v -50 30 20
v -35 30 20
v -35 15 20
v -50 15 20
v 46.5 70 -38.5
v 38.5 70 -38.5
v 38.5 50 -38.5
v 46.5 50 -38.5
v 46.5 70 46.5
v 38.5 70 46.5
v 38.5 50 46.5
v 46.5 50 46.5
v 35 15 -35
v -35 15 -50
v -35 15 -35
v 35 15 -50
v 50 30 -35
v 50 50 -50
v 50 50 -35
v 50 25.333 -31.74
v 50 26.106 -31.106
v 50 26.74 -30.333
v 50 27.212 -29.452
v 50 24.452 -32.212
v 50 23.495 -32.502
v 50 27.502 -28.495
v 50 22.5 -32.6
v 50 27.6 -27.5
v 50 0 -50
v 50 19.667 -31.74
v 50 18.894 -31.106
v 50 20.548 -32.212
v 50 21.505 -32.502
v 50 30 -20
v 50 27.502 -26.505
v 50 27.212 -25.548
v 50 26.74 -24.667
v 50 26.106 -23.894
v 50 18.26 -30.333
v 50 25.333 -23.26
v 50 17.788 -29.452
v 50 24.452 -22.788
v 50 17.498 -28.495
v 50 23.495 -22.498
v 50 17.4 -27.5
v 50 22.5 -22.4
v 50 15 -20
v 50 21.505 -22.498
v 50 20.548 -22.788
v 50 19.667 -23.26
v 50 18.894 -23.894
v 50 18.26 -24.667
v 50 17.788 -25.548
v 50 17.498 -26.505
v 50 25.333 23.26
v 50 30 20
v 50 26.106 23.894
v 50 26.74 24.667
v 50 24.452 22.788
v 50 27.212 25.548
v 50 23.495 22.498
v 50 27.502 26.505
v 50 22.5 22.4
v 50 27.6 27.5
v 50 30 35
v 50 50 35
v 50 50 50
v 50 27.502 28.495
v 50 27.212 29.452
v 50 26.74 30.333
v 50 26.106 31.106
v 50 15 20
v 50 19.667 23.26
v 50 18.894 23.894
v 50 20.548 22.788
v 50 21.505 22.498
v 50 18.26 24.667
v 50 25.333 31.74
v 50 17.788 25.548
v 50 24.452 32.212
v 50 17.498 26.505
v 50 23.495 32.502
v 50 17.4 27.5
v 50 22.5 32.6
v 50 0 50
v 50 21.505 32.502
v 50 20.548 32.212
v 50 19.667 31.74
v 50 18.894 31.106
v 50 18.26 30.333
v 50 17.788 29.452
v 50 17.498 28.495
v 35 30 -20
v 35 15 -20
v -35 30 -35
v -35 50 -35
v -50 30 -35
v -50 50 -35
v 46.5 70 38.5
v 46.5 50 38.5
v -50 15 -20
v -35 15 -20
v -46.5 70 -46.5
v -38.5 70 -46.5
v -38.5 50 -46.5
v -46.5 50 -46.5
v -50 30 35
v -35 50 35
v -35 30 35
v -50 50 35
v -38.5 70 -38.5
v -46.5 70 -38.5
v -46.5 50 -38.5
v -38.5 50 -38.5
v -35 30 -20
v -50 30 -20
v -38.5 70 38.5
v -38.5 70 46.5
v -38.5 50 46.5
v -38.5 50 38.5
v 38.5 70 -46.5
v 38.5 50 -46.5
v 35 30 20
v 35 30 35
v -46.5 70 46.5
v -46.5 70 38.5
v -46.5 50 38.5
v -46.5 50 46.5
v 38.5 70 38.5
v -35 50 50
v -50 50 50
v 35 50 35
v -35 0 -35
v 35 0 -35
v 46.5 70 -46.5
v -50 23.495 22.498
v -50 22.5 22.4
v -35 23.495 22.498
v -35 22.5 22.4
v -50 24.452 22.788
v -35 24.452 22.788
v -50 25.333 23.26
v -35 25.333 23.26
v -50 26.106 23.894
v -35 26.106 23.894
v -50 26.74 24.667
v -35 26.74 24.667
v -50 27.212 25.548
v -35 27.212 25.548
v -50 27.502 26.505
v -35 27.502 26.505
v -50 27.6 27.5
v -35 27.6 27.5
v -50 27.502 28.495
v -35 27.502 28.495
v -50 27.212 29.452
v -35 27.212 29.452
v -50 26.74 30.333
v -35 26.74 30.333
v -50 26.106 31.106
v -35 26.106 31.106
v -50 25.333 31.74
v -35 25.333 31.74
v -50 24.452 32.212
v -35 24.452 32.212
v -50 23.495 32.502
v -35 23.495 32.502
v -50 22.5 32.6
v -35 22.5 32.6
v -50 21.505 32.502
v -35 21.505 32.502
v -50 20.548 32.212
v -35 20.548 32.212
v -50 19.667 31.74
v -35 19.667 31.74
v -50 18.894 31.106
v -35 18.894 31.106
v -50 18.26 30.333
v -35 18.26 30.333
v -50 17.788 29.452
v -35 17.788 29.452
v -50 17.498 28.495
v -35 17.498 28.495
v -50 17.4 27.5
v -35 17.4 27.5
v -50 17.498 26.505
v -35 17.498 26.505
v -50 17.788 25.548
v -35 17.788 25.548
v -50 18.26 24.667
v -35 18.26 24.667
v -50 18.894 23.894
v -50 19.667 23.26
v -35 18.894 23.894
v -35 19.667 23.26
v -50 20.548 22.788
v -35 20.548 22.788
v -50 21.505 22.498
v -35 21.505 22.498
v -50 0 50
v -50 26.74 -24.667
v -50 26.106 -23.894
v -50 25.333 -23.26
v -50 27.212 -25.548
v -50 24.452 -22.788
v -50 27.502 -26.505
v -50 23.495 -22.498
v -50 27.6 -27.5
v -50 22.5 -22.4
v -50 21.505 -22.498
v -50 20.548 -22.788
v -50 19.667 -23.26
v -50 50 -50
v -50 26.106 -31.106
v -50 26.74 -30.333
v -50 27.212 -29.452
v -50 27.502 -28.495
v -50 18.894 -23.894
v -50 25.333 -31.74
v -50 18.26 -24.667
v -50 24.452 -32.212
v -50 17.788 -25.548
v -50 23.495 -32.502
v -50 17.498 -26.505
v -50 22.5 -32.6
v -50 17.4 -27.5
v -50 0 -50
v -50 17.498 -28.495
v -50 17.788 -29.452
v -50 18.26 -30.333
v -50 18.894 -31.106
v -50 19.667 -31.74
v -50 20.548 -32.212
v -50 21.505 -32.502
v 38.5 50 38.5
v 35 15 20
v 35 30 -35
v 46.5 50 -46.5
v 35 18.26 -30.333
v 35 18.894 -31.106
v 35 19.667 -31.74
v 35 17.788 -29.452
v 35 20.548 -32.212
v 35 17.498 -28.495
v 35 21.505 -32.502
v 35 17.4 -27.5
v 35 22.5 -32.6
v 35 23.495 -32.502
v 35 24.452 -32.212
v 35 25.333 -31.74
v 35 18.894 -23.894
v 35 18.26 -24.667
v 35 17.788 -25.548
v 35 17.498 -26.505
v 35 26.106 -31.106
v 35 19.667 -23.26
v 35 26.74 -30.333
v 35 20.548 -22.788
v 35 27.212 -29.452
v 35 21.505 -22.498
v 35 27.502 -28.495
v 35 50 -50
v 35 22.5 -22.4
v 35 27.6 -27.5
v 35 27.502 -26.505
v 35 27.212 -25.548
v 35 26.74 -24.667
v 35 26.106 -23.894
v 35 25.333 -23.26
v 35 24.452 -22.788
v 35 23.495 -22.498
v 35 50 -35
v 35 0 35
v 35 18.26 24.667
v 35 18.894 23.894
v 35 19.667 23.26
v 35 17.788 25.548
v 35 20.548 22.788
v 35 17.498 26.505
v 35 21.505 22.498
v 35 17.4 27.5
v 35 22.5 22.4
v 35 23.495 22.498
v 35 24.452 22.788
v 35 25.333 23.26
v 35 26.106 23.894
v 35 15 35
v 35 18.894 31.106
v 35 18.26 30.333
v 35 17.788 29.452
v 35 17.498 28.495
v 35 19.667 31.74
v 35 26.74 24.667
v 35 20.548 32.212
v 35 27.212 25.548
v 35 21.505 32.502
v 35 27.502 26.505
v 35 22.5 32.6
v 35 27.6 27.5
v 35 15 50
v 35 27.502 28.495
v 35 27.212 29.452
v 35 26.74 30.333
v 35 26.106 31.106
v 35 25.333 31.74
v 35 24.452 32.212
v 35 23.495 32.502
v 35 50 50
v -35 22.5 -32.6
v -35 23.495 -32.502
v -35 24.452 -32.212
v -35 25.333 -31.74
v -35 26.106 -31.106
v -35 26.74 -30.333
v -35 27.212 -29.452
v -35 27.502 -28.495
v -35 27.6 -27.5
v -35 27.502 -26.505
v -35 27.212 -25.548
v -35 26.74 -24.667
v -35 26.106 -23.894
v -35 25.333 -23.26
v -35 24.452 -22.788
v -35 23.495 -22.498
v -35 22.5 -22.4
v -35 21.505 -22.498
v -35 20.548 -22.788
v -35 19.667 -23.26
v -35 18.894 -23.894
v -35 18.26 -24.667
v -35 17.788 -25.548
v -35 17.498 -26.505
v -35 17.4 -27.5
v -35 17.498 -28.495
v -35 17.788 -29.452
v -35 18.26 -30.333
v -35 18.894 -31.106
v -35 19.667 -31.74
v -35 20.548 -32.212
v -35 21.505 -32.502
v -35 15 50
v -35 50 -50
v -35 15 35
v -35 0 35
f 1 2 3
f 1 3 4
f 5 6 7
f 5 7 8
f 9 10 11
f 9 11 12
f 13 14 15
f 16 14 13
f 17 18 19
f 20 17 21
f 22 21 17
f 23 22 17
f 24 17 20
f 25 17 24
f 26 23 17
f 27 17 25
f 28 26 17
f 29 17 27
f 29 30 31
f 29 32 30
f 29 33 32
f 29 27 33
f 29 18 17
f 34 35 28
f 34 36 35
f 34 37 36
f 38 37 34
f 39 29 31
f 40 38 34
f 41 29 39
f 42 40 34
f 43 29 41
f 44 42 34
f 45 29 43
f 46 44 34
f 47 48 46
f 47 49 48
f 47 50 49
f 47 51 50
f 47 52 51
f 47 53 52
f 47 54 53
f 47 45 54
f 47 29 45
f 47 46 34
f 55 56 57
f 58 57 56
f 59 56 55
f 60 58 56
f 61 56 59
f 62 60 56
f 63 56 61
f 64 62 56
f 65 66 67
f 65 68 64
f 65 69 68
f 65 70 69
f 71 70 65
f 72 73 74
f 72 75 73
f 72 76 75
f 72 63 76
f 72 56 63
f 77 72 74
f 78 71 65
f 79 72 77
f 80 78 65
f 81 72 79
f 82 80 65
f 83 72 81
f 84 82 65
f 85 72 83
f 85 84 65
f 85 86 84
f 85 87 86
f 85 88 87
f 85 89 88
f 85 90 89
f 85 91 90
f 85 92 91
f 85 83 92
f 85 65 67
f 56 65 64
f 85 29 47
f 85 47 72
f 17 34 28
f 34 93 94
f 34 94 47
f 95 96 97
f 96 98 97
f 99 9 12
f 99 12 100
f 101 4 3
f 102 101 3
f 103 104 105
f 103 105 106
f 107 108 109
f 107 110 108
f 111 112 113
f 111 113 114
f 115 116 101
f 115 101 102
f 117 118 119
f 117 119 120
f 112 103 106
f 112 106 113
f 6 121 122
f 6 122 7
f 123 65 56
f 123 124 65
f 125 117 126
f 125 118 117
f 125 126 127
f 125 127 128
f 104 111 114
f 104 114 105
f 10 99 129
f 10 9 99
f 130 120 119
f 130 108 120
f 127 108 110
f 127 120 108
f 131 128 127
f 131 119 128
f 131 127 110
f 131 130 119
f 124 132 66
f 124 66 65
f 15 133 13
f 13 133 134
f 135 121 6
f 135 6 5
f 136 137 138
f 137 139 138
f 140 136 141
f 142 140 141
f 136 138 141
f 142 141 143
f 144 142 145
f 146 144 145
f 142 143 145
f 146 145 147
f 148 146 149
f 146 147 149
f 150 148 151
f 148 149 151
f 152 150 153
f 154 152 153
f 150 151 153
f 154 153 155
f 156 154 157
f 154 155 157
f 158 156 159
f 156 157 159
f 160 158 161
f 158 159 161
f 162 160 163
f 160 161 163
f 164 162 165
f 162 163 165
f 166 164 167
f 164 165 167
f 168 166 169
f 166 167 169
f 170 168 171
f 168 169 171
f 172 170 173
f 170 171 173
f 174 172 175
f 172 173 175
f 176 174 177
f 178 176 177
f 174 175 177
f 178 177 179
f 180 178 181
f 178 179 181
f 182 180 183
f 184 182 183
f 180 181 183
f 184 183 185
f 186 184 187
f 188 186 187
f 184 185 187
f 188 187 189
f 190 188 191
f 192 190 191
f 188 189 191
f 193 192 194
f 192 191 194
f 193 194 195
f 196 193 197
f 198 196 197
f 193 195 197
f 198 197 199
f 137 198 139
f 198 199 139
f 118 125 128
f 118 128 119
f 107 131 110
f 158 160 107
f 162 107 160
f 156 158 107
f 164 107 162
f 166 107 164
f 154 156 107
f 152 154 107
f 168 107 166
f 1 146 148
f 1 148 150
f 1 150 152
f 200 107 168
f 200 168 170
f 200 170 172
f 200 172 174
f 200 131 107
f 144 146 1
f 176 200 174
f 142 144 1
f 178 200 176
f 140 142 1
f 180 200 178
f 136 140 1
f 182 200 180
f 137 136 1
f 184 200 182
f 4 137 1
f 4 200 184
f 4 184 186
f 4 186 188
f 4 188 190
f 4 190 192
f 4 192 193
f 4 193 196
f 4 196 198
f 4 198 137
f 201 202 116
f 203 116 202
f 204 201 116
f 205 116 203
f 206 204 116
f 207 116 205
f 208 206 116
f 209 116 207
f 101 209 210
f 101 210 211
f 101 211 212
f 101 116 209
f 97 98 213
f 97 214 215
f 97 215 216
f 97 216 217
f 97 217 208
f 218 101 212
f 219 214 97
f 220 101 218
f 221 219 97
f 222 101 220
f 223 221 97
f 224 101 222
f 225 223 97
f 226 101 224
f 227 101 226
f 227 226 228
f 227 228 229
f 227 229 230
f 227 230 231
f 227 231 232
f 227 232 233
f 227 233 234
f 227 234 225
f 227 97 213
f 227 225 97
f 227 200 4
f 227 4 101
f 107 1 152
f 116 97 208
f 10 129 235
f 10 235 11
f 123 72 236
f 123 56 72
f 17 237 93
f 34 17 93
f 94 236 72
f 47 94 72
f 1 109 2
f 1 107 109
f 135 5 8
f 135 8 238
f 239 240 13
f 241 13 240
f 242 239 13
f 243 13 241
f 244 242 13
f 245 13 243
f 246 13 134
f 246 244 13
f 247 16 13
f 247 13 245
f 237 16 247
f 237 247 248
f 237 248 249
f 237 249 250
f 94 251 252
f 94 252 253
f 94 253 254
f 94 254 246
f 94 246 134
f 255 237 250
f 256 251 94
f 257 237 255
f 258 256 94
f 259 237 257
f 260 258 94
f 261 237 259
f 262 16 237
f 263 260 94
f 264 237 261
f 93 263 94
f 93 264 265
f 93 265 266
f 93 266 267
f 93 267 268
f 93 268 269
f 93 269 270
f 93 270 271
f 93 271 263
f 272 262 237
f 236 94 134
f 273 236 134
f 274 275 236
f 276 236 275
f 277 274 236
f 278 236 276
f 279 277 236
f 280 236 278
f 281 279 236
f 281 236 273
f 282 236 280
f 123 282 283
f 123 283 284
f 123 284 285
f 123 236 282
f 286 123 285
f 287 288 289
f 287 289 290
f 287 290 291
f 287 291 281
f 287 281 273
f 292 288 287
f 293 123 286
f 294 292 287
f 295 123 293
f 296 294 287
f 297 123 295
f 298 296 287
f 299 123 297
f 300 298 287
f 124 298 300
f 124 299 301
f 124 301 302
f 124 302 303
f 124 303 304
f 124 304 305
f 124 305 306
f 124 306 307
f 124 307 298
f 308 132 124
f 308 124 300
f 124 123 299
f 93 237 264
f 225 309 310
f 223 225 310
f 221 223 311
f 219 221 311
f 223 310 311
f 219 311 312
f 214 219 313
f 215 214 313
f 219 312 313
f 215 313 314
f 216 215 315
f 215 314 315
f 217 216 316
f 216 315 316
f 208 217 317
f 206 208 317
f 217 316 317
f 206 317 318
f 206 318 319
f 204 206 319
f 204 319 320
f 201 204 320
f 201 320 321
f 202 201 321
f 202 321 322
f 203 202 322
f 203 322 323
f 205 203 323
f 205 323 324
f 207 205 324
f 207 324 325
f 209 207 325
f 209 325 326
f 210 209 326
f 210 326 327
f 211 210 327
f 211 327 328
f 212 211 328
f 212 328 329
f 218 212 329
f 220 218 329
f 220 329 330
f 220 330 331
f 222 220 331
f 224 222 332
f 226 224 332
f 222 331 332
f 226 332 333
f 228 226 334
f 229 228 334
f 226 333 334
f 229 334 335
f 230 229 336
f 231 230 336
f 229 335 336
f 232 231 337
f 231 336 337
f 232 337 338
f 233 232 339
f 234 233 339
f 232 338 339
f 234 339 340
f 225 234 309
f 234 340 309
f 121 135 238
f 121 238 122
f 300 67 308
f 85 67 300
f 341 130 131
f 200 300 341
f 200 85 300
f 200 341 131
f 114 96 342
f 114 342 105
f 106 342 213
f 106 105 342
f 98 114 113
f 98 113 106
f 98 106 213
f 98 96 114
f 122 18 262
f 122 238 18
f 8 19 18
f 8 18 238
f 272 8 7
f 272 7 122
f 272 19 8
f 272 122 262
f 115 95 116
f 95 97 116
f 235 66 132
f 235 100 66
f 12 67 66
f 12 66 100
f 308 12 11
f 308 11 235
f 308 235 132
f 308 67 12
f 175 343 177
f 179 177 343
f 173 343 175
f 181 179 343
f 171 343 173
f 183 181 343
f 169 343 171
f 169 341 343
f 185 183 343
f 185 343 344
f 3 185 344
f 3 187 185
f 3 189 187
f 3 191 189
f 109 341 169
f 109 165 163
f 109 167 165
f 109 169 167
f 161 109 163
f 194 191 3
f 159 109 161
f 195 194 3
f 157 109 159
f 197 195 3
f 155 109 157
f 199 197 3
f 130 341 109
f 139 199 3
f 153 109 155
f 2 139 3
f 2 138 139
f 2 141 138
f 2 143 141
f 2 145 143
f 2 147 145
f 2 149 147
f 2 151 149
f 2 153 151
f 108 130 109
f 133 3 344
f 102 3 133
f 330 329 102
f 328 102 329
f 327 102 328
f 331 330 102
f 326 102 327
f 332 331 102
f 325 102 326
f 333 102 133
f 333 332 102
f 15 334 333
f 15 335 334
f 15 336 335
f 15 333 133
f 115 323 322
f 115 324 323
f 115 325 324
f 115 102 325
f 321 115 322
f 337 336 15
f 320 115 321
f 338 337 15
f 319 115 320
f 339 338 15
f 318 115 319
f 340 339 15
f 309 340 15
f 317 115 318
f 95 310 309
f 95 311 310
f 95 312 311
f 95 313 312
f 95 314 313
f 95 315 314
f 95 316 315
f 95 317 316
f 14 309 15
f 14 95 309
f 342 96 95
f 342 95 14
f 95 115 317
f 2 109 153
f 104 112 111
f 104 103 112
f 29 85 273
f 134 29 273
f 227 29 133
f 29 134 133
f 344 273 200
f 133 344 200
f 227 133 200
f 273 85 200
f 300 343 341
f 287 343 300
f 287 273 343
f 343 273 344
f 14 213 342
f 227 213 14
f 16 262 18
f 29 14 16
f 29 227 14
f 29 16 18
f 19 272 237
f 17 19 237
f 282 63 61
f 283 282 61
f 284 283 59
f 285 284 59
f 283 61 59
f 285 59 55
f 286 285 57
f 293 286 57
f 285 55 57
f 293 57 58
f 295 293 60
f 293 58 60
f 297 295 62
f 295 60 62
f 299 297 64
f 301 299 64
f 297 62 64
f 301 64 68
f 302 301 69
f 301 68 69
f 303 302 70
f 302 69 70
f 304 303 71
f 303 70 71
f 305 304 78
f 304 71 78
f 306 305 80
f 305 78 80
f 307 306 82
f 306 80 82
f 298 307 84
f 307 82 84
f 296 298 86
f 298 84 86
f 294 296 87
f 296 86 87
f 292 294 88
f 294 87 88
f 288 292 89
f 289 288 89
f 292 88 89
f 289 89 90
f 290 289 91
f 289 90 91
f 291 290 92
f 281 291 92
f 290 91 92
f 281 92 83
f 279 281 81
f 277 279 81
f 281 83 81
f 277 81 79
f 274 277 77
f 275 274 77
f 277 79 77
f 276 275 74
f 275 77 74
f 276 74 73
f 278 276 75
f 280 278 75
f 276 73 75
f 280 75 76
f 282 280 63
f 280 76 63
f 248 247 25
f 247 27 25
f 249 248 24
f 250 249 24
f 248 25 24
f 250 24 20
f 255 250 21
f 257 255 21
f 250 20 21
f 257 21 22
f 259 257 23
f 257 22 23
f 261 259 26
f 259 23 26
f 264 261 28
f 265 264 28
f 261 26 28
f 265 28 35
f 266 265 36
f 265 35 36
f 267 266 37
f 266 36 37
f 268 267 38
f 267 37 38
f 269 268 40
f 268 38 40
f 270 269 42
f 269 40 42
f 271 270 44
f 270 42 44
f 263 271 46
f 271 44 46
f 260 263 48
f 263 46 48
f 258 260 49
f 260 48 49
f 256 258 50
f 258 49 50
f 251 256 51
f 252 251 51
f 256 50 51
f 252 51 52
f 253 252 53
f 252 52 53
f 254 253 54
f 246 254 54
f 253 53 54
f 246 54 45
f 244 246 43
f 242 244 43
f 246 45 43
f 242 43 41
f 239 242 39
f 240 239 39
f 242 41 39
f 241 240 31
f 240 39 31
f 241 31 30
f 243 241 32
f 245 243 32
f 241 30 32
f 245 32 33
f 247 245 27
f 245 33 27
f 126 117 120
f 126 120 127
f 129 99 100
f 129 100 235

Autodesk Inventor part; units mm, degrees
ref_plane "YZ Plane" through (0, 0, 0) normal (1, 0, 0) x (0, 1, 0)
ref_plane "XZ Plane" through (0, 0, 0) normal (0, 1, 0) x (-1, 0, 0)
ref_plane "XY Plane" through (0, 0, 0) normal (0, 0, 1) x (1, 0, 0)
sketch "Эскиз1" plane through (0, 0, 0) normal (0, 1, 0) x (-1, 0, 0)
  line L0 (-50, 50) -> (50, 50)
  line L1 (50, 50) -> (50, -50)
  line L2 (50, -50) -> (-50, -50)
  line L3 (-50, -50) -> (-50, 50)
  line L4 (-50, 50) -> (50, -50) construction
  line L5 (50, 50) -> (-50, -50) construction
  line L6 (-35, 35) -> (35, 35)
  line L7 (35, 35) -> (35, -35)
  line L8 (35, -35) -> (-35, -35)
  line L9 (-35, -35) -> (-35, 35)
  line L10 (-35, 35) -> (35, -35) construction
  line L11 (35, 35) -> (-35, -35) construction
  point P0 (0, 0)
  dimension "d0" = 100
  dimension "d1" = 100
  dimension "d2" = 15
  dimension "d3" = 15
extrude "Выдавливание1" add sketch "Эскиз1" along normal blind 50
sketch "Эскиз3" plane through (0, 50, 0) normal (0, 1, 0) x (1, 0, 0)
  line L0 (-35, 35) -> (-35, -35) projected
  line L1 (-35, 0) -> (-50, 0)
  line L2 (-50, -50) -> (-50, 50) projected
  line L3 (35, -35) -> (35, 35) projected
  line L4 (35, 0) -> (50, 0)
  line L5 (50, 50) -> (50, -50) projected
  line L6 (-35, -20) -> (-50, -20)
  line L7 (-50, -20) -> (-50, 20)
  line L8 (-50, 20) -> (-35, 20)
  line L9 (-35, 20) -> (-35, -20)
  line L10 (-35, -20) -> (-50, 20) construction
  line L11 (-50, -20) -> (-35, 20) construction
  line L12 (50, -20) -> (35, -20)
  line L13 (35, -20) -> (35, 20)
  line L14 (35, 20) -> (50, 20)
  line L15 (50, 20) -> (50, -20)
  line L16 (50, -20) -> (35, 20) construction
  line L17 (35, -20) -> (50, 20) construction
  line L18 (-35, -35) -> (35, -35) projected
  line L19 (0, -35) -> (0, -50)
  line L20 (50, -50) -> (-50, -50) projected
  line L21 (35, 35) -> (-35, 35) projected
  line L22 (0, 35) -> (0, 50)
  line L23 (-50, 50) -> (50, 50) projected
  line L24 (35, -50) -> (-35, -50)
  line L25 (-35, -50) -> (-35, -35)
  line L26 (-35, -35) -> (35, -35)
  line L27 (35, -35) -> (35, -50)
  line L28 (35, -50) -> (-35, -35) construction
  line L29 (-35, -50) -> (35, -35) construction
  line L30 (35, 50) -> (-35, 50)
  line L31 (-35, 50) -> (-35, 35)
  line L32 (-35, 35) -> (35, 35)
  line L33 (35, 35) -> (35, 50)
  line L34 (35, 50) -> (-35, 35) construction
  line L35 (-35, 50) -> (35, 35) construction
  point P0 (0, 0)
  point P1 (-42.5, 0)
  point P2 (42.5, 0)
  point P3 (0, -42.5)
  point P4 (0, 42.5)
  dimension "d14" = 40
  dimension "d15" = 40
extrude "Выдавливание2" cut sketch "Эскиз3" against normal blind 35 contours L31 L23 L22 L21 | L0 L1 L2 L8 | L22 L23 L33 L21 | L0 L6 L2 L1 | L14 L5 L4 L3 | L18 L19 L20 L25 | L4 L5 L12 L3 | L18 L27 L20 L19
sketch "Эскиз4" plane through (-35, 0, 35) normal (1, 0, 0) x (0, 0, -1)
  line L0 (15, 15) -> (15, 50) projected
  line L1 (15, 50) -> (0, 50)
  line L2 (0, 50) -> (0, 30)
  line L3 (0, 30) -> (15, 30)
  line L4 (15, 30) -> (15, 50)
  line L5 (85, 50) -> (55, 50) projected
  line L6 (55, 50) -> (70, 50)
  line L7 (70, 50) -> (70, 30)
  line L8 (70, 30) -> (55, 30)
  line L9 (55, 30) -> (55, 50)
  point P0 (35, 0)
  dimension "d18" = 15
  dimension "d19" = 20
  dimension "d20" = 15
  dimension "d21" = 20
extrude "Выдавливание3" cut sketch "Эскиз4" along normal blind 90.5 and the other way blind 45.25
sketch "Эскиз5" plane through (50, 0, 50) normal (1, 0, 0) x (0, 0, -1)
  circle A0 centre (22.5, 22.5) radius 5.1
  circle A1 centre (77.5, 22.5) radius 5.1
  line L0 (85, 30) -> (70, 30) projected
  line L1 (70, 30) -> (70, 15) projected
  line L2 (30, 15) -> (30, 30) projected
  line L3 (30, 30) -> (15, 30) projected
  point P0 (50, 0)
  dimension "d26" = 10.2
  dimension "d27" = 10.2
  dimension "d28" = 7.5
  dimension "d29" = 7.5
  dimension "d30" = 7.5
  dimension "d31" = 7.5
extrude "Выдавливание4" cut sketch "Эскиз5" against normal blind 156
sketch "Эскиз6" plane through (0, 50, 0) normal (0, 1, 0) x (1, 0, 0)
  line L0 (-35, 35) -> (-50, 35) projected
  line L1 (-50, 50) -> (50, 50) projected
  line L2 (-38.5, 46.5) -> (-46.5, 46.5)
  line L3 (-46.5, 46.5) -> (-46.5, 38.5)
  line L4 (-46.5, 38.5) -> (-38.5, 38.5)
  line L5 (-38.5, 38.5) -> (-38.5, 46.5)
  line L6 (-38.5, 46.5) -> (-46.5, 38.5) construction
  line L7 (-46.5, 46.5) -> (-38.5, 38.5) construction
  line L8 (-50, 50) -> (-50, 35) projected
  point P0 (0, 0)
  point P1 (-42.5, 42.5)
  dimension "d34" = 8
  dimension "d35" = 8
  dimension "d41" = 7.5
  dimension "d42" = 7.5
extrude "Выдавливание5" add sketch "Эскиз6" along normal blind 20
mirror "Mirror1" about plane through (0, 0, 0) normal (1, 0, 0) of "Выдавливание5"
mirror "Mirror2" about plane through (0, 0, 0) normal (0, 0, 1) of "Выдавливание5", "Mirror1"
properties part number "000.113 - Верх центрального сегмента"
